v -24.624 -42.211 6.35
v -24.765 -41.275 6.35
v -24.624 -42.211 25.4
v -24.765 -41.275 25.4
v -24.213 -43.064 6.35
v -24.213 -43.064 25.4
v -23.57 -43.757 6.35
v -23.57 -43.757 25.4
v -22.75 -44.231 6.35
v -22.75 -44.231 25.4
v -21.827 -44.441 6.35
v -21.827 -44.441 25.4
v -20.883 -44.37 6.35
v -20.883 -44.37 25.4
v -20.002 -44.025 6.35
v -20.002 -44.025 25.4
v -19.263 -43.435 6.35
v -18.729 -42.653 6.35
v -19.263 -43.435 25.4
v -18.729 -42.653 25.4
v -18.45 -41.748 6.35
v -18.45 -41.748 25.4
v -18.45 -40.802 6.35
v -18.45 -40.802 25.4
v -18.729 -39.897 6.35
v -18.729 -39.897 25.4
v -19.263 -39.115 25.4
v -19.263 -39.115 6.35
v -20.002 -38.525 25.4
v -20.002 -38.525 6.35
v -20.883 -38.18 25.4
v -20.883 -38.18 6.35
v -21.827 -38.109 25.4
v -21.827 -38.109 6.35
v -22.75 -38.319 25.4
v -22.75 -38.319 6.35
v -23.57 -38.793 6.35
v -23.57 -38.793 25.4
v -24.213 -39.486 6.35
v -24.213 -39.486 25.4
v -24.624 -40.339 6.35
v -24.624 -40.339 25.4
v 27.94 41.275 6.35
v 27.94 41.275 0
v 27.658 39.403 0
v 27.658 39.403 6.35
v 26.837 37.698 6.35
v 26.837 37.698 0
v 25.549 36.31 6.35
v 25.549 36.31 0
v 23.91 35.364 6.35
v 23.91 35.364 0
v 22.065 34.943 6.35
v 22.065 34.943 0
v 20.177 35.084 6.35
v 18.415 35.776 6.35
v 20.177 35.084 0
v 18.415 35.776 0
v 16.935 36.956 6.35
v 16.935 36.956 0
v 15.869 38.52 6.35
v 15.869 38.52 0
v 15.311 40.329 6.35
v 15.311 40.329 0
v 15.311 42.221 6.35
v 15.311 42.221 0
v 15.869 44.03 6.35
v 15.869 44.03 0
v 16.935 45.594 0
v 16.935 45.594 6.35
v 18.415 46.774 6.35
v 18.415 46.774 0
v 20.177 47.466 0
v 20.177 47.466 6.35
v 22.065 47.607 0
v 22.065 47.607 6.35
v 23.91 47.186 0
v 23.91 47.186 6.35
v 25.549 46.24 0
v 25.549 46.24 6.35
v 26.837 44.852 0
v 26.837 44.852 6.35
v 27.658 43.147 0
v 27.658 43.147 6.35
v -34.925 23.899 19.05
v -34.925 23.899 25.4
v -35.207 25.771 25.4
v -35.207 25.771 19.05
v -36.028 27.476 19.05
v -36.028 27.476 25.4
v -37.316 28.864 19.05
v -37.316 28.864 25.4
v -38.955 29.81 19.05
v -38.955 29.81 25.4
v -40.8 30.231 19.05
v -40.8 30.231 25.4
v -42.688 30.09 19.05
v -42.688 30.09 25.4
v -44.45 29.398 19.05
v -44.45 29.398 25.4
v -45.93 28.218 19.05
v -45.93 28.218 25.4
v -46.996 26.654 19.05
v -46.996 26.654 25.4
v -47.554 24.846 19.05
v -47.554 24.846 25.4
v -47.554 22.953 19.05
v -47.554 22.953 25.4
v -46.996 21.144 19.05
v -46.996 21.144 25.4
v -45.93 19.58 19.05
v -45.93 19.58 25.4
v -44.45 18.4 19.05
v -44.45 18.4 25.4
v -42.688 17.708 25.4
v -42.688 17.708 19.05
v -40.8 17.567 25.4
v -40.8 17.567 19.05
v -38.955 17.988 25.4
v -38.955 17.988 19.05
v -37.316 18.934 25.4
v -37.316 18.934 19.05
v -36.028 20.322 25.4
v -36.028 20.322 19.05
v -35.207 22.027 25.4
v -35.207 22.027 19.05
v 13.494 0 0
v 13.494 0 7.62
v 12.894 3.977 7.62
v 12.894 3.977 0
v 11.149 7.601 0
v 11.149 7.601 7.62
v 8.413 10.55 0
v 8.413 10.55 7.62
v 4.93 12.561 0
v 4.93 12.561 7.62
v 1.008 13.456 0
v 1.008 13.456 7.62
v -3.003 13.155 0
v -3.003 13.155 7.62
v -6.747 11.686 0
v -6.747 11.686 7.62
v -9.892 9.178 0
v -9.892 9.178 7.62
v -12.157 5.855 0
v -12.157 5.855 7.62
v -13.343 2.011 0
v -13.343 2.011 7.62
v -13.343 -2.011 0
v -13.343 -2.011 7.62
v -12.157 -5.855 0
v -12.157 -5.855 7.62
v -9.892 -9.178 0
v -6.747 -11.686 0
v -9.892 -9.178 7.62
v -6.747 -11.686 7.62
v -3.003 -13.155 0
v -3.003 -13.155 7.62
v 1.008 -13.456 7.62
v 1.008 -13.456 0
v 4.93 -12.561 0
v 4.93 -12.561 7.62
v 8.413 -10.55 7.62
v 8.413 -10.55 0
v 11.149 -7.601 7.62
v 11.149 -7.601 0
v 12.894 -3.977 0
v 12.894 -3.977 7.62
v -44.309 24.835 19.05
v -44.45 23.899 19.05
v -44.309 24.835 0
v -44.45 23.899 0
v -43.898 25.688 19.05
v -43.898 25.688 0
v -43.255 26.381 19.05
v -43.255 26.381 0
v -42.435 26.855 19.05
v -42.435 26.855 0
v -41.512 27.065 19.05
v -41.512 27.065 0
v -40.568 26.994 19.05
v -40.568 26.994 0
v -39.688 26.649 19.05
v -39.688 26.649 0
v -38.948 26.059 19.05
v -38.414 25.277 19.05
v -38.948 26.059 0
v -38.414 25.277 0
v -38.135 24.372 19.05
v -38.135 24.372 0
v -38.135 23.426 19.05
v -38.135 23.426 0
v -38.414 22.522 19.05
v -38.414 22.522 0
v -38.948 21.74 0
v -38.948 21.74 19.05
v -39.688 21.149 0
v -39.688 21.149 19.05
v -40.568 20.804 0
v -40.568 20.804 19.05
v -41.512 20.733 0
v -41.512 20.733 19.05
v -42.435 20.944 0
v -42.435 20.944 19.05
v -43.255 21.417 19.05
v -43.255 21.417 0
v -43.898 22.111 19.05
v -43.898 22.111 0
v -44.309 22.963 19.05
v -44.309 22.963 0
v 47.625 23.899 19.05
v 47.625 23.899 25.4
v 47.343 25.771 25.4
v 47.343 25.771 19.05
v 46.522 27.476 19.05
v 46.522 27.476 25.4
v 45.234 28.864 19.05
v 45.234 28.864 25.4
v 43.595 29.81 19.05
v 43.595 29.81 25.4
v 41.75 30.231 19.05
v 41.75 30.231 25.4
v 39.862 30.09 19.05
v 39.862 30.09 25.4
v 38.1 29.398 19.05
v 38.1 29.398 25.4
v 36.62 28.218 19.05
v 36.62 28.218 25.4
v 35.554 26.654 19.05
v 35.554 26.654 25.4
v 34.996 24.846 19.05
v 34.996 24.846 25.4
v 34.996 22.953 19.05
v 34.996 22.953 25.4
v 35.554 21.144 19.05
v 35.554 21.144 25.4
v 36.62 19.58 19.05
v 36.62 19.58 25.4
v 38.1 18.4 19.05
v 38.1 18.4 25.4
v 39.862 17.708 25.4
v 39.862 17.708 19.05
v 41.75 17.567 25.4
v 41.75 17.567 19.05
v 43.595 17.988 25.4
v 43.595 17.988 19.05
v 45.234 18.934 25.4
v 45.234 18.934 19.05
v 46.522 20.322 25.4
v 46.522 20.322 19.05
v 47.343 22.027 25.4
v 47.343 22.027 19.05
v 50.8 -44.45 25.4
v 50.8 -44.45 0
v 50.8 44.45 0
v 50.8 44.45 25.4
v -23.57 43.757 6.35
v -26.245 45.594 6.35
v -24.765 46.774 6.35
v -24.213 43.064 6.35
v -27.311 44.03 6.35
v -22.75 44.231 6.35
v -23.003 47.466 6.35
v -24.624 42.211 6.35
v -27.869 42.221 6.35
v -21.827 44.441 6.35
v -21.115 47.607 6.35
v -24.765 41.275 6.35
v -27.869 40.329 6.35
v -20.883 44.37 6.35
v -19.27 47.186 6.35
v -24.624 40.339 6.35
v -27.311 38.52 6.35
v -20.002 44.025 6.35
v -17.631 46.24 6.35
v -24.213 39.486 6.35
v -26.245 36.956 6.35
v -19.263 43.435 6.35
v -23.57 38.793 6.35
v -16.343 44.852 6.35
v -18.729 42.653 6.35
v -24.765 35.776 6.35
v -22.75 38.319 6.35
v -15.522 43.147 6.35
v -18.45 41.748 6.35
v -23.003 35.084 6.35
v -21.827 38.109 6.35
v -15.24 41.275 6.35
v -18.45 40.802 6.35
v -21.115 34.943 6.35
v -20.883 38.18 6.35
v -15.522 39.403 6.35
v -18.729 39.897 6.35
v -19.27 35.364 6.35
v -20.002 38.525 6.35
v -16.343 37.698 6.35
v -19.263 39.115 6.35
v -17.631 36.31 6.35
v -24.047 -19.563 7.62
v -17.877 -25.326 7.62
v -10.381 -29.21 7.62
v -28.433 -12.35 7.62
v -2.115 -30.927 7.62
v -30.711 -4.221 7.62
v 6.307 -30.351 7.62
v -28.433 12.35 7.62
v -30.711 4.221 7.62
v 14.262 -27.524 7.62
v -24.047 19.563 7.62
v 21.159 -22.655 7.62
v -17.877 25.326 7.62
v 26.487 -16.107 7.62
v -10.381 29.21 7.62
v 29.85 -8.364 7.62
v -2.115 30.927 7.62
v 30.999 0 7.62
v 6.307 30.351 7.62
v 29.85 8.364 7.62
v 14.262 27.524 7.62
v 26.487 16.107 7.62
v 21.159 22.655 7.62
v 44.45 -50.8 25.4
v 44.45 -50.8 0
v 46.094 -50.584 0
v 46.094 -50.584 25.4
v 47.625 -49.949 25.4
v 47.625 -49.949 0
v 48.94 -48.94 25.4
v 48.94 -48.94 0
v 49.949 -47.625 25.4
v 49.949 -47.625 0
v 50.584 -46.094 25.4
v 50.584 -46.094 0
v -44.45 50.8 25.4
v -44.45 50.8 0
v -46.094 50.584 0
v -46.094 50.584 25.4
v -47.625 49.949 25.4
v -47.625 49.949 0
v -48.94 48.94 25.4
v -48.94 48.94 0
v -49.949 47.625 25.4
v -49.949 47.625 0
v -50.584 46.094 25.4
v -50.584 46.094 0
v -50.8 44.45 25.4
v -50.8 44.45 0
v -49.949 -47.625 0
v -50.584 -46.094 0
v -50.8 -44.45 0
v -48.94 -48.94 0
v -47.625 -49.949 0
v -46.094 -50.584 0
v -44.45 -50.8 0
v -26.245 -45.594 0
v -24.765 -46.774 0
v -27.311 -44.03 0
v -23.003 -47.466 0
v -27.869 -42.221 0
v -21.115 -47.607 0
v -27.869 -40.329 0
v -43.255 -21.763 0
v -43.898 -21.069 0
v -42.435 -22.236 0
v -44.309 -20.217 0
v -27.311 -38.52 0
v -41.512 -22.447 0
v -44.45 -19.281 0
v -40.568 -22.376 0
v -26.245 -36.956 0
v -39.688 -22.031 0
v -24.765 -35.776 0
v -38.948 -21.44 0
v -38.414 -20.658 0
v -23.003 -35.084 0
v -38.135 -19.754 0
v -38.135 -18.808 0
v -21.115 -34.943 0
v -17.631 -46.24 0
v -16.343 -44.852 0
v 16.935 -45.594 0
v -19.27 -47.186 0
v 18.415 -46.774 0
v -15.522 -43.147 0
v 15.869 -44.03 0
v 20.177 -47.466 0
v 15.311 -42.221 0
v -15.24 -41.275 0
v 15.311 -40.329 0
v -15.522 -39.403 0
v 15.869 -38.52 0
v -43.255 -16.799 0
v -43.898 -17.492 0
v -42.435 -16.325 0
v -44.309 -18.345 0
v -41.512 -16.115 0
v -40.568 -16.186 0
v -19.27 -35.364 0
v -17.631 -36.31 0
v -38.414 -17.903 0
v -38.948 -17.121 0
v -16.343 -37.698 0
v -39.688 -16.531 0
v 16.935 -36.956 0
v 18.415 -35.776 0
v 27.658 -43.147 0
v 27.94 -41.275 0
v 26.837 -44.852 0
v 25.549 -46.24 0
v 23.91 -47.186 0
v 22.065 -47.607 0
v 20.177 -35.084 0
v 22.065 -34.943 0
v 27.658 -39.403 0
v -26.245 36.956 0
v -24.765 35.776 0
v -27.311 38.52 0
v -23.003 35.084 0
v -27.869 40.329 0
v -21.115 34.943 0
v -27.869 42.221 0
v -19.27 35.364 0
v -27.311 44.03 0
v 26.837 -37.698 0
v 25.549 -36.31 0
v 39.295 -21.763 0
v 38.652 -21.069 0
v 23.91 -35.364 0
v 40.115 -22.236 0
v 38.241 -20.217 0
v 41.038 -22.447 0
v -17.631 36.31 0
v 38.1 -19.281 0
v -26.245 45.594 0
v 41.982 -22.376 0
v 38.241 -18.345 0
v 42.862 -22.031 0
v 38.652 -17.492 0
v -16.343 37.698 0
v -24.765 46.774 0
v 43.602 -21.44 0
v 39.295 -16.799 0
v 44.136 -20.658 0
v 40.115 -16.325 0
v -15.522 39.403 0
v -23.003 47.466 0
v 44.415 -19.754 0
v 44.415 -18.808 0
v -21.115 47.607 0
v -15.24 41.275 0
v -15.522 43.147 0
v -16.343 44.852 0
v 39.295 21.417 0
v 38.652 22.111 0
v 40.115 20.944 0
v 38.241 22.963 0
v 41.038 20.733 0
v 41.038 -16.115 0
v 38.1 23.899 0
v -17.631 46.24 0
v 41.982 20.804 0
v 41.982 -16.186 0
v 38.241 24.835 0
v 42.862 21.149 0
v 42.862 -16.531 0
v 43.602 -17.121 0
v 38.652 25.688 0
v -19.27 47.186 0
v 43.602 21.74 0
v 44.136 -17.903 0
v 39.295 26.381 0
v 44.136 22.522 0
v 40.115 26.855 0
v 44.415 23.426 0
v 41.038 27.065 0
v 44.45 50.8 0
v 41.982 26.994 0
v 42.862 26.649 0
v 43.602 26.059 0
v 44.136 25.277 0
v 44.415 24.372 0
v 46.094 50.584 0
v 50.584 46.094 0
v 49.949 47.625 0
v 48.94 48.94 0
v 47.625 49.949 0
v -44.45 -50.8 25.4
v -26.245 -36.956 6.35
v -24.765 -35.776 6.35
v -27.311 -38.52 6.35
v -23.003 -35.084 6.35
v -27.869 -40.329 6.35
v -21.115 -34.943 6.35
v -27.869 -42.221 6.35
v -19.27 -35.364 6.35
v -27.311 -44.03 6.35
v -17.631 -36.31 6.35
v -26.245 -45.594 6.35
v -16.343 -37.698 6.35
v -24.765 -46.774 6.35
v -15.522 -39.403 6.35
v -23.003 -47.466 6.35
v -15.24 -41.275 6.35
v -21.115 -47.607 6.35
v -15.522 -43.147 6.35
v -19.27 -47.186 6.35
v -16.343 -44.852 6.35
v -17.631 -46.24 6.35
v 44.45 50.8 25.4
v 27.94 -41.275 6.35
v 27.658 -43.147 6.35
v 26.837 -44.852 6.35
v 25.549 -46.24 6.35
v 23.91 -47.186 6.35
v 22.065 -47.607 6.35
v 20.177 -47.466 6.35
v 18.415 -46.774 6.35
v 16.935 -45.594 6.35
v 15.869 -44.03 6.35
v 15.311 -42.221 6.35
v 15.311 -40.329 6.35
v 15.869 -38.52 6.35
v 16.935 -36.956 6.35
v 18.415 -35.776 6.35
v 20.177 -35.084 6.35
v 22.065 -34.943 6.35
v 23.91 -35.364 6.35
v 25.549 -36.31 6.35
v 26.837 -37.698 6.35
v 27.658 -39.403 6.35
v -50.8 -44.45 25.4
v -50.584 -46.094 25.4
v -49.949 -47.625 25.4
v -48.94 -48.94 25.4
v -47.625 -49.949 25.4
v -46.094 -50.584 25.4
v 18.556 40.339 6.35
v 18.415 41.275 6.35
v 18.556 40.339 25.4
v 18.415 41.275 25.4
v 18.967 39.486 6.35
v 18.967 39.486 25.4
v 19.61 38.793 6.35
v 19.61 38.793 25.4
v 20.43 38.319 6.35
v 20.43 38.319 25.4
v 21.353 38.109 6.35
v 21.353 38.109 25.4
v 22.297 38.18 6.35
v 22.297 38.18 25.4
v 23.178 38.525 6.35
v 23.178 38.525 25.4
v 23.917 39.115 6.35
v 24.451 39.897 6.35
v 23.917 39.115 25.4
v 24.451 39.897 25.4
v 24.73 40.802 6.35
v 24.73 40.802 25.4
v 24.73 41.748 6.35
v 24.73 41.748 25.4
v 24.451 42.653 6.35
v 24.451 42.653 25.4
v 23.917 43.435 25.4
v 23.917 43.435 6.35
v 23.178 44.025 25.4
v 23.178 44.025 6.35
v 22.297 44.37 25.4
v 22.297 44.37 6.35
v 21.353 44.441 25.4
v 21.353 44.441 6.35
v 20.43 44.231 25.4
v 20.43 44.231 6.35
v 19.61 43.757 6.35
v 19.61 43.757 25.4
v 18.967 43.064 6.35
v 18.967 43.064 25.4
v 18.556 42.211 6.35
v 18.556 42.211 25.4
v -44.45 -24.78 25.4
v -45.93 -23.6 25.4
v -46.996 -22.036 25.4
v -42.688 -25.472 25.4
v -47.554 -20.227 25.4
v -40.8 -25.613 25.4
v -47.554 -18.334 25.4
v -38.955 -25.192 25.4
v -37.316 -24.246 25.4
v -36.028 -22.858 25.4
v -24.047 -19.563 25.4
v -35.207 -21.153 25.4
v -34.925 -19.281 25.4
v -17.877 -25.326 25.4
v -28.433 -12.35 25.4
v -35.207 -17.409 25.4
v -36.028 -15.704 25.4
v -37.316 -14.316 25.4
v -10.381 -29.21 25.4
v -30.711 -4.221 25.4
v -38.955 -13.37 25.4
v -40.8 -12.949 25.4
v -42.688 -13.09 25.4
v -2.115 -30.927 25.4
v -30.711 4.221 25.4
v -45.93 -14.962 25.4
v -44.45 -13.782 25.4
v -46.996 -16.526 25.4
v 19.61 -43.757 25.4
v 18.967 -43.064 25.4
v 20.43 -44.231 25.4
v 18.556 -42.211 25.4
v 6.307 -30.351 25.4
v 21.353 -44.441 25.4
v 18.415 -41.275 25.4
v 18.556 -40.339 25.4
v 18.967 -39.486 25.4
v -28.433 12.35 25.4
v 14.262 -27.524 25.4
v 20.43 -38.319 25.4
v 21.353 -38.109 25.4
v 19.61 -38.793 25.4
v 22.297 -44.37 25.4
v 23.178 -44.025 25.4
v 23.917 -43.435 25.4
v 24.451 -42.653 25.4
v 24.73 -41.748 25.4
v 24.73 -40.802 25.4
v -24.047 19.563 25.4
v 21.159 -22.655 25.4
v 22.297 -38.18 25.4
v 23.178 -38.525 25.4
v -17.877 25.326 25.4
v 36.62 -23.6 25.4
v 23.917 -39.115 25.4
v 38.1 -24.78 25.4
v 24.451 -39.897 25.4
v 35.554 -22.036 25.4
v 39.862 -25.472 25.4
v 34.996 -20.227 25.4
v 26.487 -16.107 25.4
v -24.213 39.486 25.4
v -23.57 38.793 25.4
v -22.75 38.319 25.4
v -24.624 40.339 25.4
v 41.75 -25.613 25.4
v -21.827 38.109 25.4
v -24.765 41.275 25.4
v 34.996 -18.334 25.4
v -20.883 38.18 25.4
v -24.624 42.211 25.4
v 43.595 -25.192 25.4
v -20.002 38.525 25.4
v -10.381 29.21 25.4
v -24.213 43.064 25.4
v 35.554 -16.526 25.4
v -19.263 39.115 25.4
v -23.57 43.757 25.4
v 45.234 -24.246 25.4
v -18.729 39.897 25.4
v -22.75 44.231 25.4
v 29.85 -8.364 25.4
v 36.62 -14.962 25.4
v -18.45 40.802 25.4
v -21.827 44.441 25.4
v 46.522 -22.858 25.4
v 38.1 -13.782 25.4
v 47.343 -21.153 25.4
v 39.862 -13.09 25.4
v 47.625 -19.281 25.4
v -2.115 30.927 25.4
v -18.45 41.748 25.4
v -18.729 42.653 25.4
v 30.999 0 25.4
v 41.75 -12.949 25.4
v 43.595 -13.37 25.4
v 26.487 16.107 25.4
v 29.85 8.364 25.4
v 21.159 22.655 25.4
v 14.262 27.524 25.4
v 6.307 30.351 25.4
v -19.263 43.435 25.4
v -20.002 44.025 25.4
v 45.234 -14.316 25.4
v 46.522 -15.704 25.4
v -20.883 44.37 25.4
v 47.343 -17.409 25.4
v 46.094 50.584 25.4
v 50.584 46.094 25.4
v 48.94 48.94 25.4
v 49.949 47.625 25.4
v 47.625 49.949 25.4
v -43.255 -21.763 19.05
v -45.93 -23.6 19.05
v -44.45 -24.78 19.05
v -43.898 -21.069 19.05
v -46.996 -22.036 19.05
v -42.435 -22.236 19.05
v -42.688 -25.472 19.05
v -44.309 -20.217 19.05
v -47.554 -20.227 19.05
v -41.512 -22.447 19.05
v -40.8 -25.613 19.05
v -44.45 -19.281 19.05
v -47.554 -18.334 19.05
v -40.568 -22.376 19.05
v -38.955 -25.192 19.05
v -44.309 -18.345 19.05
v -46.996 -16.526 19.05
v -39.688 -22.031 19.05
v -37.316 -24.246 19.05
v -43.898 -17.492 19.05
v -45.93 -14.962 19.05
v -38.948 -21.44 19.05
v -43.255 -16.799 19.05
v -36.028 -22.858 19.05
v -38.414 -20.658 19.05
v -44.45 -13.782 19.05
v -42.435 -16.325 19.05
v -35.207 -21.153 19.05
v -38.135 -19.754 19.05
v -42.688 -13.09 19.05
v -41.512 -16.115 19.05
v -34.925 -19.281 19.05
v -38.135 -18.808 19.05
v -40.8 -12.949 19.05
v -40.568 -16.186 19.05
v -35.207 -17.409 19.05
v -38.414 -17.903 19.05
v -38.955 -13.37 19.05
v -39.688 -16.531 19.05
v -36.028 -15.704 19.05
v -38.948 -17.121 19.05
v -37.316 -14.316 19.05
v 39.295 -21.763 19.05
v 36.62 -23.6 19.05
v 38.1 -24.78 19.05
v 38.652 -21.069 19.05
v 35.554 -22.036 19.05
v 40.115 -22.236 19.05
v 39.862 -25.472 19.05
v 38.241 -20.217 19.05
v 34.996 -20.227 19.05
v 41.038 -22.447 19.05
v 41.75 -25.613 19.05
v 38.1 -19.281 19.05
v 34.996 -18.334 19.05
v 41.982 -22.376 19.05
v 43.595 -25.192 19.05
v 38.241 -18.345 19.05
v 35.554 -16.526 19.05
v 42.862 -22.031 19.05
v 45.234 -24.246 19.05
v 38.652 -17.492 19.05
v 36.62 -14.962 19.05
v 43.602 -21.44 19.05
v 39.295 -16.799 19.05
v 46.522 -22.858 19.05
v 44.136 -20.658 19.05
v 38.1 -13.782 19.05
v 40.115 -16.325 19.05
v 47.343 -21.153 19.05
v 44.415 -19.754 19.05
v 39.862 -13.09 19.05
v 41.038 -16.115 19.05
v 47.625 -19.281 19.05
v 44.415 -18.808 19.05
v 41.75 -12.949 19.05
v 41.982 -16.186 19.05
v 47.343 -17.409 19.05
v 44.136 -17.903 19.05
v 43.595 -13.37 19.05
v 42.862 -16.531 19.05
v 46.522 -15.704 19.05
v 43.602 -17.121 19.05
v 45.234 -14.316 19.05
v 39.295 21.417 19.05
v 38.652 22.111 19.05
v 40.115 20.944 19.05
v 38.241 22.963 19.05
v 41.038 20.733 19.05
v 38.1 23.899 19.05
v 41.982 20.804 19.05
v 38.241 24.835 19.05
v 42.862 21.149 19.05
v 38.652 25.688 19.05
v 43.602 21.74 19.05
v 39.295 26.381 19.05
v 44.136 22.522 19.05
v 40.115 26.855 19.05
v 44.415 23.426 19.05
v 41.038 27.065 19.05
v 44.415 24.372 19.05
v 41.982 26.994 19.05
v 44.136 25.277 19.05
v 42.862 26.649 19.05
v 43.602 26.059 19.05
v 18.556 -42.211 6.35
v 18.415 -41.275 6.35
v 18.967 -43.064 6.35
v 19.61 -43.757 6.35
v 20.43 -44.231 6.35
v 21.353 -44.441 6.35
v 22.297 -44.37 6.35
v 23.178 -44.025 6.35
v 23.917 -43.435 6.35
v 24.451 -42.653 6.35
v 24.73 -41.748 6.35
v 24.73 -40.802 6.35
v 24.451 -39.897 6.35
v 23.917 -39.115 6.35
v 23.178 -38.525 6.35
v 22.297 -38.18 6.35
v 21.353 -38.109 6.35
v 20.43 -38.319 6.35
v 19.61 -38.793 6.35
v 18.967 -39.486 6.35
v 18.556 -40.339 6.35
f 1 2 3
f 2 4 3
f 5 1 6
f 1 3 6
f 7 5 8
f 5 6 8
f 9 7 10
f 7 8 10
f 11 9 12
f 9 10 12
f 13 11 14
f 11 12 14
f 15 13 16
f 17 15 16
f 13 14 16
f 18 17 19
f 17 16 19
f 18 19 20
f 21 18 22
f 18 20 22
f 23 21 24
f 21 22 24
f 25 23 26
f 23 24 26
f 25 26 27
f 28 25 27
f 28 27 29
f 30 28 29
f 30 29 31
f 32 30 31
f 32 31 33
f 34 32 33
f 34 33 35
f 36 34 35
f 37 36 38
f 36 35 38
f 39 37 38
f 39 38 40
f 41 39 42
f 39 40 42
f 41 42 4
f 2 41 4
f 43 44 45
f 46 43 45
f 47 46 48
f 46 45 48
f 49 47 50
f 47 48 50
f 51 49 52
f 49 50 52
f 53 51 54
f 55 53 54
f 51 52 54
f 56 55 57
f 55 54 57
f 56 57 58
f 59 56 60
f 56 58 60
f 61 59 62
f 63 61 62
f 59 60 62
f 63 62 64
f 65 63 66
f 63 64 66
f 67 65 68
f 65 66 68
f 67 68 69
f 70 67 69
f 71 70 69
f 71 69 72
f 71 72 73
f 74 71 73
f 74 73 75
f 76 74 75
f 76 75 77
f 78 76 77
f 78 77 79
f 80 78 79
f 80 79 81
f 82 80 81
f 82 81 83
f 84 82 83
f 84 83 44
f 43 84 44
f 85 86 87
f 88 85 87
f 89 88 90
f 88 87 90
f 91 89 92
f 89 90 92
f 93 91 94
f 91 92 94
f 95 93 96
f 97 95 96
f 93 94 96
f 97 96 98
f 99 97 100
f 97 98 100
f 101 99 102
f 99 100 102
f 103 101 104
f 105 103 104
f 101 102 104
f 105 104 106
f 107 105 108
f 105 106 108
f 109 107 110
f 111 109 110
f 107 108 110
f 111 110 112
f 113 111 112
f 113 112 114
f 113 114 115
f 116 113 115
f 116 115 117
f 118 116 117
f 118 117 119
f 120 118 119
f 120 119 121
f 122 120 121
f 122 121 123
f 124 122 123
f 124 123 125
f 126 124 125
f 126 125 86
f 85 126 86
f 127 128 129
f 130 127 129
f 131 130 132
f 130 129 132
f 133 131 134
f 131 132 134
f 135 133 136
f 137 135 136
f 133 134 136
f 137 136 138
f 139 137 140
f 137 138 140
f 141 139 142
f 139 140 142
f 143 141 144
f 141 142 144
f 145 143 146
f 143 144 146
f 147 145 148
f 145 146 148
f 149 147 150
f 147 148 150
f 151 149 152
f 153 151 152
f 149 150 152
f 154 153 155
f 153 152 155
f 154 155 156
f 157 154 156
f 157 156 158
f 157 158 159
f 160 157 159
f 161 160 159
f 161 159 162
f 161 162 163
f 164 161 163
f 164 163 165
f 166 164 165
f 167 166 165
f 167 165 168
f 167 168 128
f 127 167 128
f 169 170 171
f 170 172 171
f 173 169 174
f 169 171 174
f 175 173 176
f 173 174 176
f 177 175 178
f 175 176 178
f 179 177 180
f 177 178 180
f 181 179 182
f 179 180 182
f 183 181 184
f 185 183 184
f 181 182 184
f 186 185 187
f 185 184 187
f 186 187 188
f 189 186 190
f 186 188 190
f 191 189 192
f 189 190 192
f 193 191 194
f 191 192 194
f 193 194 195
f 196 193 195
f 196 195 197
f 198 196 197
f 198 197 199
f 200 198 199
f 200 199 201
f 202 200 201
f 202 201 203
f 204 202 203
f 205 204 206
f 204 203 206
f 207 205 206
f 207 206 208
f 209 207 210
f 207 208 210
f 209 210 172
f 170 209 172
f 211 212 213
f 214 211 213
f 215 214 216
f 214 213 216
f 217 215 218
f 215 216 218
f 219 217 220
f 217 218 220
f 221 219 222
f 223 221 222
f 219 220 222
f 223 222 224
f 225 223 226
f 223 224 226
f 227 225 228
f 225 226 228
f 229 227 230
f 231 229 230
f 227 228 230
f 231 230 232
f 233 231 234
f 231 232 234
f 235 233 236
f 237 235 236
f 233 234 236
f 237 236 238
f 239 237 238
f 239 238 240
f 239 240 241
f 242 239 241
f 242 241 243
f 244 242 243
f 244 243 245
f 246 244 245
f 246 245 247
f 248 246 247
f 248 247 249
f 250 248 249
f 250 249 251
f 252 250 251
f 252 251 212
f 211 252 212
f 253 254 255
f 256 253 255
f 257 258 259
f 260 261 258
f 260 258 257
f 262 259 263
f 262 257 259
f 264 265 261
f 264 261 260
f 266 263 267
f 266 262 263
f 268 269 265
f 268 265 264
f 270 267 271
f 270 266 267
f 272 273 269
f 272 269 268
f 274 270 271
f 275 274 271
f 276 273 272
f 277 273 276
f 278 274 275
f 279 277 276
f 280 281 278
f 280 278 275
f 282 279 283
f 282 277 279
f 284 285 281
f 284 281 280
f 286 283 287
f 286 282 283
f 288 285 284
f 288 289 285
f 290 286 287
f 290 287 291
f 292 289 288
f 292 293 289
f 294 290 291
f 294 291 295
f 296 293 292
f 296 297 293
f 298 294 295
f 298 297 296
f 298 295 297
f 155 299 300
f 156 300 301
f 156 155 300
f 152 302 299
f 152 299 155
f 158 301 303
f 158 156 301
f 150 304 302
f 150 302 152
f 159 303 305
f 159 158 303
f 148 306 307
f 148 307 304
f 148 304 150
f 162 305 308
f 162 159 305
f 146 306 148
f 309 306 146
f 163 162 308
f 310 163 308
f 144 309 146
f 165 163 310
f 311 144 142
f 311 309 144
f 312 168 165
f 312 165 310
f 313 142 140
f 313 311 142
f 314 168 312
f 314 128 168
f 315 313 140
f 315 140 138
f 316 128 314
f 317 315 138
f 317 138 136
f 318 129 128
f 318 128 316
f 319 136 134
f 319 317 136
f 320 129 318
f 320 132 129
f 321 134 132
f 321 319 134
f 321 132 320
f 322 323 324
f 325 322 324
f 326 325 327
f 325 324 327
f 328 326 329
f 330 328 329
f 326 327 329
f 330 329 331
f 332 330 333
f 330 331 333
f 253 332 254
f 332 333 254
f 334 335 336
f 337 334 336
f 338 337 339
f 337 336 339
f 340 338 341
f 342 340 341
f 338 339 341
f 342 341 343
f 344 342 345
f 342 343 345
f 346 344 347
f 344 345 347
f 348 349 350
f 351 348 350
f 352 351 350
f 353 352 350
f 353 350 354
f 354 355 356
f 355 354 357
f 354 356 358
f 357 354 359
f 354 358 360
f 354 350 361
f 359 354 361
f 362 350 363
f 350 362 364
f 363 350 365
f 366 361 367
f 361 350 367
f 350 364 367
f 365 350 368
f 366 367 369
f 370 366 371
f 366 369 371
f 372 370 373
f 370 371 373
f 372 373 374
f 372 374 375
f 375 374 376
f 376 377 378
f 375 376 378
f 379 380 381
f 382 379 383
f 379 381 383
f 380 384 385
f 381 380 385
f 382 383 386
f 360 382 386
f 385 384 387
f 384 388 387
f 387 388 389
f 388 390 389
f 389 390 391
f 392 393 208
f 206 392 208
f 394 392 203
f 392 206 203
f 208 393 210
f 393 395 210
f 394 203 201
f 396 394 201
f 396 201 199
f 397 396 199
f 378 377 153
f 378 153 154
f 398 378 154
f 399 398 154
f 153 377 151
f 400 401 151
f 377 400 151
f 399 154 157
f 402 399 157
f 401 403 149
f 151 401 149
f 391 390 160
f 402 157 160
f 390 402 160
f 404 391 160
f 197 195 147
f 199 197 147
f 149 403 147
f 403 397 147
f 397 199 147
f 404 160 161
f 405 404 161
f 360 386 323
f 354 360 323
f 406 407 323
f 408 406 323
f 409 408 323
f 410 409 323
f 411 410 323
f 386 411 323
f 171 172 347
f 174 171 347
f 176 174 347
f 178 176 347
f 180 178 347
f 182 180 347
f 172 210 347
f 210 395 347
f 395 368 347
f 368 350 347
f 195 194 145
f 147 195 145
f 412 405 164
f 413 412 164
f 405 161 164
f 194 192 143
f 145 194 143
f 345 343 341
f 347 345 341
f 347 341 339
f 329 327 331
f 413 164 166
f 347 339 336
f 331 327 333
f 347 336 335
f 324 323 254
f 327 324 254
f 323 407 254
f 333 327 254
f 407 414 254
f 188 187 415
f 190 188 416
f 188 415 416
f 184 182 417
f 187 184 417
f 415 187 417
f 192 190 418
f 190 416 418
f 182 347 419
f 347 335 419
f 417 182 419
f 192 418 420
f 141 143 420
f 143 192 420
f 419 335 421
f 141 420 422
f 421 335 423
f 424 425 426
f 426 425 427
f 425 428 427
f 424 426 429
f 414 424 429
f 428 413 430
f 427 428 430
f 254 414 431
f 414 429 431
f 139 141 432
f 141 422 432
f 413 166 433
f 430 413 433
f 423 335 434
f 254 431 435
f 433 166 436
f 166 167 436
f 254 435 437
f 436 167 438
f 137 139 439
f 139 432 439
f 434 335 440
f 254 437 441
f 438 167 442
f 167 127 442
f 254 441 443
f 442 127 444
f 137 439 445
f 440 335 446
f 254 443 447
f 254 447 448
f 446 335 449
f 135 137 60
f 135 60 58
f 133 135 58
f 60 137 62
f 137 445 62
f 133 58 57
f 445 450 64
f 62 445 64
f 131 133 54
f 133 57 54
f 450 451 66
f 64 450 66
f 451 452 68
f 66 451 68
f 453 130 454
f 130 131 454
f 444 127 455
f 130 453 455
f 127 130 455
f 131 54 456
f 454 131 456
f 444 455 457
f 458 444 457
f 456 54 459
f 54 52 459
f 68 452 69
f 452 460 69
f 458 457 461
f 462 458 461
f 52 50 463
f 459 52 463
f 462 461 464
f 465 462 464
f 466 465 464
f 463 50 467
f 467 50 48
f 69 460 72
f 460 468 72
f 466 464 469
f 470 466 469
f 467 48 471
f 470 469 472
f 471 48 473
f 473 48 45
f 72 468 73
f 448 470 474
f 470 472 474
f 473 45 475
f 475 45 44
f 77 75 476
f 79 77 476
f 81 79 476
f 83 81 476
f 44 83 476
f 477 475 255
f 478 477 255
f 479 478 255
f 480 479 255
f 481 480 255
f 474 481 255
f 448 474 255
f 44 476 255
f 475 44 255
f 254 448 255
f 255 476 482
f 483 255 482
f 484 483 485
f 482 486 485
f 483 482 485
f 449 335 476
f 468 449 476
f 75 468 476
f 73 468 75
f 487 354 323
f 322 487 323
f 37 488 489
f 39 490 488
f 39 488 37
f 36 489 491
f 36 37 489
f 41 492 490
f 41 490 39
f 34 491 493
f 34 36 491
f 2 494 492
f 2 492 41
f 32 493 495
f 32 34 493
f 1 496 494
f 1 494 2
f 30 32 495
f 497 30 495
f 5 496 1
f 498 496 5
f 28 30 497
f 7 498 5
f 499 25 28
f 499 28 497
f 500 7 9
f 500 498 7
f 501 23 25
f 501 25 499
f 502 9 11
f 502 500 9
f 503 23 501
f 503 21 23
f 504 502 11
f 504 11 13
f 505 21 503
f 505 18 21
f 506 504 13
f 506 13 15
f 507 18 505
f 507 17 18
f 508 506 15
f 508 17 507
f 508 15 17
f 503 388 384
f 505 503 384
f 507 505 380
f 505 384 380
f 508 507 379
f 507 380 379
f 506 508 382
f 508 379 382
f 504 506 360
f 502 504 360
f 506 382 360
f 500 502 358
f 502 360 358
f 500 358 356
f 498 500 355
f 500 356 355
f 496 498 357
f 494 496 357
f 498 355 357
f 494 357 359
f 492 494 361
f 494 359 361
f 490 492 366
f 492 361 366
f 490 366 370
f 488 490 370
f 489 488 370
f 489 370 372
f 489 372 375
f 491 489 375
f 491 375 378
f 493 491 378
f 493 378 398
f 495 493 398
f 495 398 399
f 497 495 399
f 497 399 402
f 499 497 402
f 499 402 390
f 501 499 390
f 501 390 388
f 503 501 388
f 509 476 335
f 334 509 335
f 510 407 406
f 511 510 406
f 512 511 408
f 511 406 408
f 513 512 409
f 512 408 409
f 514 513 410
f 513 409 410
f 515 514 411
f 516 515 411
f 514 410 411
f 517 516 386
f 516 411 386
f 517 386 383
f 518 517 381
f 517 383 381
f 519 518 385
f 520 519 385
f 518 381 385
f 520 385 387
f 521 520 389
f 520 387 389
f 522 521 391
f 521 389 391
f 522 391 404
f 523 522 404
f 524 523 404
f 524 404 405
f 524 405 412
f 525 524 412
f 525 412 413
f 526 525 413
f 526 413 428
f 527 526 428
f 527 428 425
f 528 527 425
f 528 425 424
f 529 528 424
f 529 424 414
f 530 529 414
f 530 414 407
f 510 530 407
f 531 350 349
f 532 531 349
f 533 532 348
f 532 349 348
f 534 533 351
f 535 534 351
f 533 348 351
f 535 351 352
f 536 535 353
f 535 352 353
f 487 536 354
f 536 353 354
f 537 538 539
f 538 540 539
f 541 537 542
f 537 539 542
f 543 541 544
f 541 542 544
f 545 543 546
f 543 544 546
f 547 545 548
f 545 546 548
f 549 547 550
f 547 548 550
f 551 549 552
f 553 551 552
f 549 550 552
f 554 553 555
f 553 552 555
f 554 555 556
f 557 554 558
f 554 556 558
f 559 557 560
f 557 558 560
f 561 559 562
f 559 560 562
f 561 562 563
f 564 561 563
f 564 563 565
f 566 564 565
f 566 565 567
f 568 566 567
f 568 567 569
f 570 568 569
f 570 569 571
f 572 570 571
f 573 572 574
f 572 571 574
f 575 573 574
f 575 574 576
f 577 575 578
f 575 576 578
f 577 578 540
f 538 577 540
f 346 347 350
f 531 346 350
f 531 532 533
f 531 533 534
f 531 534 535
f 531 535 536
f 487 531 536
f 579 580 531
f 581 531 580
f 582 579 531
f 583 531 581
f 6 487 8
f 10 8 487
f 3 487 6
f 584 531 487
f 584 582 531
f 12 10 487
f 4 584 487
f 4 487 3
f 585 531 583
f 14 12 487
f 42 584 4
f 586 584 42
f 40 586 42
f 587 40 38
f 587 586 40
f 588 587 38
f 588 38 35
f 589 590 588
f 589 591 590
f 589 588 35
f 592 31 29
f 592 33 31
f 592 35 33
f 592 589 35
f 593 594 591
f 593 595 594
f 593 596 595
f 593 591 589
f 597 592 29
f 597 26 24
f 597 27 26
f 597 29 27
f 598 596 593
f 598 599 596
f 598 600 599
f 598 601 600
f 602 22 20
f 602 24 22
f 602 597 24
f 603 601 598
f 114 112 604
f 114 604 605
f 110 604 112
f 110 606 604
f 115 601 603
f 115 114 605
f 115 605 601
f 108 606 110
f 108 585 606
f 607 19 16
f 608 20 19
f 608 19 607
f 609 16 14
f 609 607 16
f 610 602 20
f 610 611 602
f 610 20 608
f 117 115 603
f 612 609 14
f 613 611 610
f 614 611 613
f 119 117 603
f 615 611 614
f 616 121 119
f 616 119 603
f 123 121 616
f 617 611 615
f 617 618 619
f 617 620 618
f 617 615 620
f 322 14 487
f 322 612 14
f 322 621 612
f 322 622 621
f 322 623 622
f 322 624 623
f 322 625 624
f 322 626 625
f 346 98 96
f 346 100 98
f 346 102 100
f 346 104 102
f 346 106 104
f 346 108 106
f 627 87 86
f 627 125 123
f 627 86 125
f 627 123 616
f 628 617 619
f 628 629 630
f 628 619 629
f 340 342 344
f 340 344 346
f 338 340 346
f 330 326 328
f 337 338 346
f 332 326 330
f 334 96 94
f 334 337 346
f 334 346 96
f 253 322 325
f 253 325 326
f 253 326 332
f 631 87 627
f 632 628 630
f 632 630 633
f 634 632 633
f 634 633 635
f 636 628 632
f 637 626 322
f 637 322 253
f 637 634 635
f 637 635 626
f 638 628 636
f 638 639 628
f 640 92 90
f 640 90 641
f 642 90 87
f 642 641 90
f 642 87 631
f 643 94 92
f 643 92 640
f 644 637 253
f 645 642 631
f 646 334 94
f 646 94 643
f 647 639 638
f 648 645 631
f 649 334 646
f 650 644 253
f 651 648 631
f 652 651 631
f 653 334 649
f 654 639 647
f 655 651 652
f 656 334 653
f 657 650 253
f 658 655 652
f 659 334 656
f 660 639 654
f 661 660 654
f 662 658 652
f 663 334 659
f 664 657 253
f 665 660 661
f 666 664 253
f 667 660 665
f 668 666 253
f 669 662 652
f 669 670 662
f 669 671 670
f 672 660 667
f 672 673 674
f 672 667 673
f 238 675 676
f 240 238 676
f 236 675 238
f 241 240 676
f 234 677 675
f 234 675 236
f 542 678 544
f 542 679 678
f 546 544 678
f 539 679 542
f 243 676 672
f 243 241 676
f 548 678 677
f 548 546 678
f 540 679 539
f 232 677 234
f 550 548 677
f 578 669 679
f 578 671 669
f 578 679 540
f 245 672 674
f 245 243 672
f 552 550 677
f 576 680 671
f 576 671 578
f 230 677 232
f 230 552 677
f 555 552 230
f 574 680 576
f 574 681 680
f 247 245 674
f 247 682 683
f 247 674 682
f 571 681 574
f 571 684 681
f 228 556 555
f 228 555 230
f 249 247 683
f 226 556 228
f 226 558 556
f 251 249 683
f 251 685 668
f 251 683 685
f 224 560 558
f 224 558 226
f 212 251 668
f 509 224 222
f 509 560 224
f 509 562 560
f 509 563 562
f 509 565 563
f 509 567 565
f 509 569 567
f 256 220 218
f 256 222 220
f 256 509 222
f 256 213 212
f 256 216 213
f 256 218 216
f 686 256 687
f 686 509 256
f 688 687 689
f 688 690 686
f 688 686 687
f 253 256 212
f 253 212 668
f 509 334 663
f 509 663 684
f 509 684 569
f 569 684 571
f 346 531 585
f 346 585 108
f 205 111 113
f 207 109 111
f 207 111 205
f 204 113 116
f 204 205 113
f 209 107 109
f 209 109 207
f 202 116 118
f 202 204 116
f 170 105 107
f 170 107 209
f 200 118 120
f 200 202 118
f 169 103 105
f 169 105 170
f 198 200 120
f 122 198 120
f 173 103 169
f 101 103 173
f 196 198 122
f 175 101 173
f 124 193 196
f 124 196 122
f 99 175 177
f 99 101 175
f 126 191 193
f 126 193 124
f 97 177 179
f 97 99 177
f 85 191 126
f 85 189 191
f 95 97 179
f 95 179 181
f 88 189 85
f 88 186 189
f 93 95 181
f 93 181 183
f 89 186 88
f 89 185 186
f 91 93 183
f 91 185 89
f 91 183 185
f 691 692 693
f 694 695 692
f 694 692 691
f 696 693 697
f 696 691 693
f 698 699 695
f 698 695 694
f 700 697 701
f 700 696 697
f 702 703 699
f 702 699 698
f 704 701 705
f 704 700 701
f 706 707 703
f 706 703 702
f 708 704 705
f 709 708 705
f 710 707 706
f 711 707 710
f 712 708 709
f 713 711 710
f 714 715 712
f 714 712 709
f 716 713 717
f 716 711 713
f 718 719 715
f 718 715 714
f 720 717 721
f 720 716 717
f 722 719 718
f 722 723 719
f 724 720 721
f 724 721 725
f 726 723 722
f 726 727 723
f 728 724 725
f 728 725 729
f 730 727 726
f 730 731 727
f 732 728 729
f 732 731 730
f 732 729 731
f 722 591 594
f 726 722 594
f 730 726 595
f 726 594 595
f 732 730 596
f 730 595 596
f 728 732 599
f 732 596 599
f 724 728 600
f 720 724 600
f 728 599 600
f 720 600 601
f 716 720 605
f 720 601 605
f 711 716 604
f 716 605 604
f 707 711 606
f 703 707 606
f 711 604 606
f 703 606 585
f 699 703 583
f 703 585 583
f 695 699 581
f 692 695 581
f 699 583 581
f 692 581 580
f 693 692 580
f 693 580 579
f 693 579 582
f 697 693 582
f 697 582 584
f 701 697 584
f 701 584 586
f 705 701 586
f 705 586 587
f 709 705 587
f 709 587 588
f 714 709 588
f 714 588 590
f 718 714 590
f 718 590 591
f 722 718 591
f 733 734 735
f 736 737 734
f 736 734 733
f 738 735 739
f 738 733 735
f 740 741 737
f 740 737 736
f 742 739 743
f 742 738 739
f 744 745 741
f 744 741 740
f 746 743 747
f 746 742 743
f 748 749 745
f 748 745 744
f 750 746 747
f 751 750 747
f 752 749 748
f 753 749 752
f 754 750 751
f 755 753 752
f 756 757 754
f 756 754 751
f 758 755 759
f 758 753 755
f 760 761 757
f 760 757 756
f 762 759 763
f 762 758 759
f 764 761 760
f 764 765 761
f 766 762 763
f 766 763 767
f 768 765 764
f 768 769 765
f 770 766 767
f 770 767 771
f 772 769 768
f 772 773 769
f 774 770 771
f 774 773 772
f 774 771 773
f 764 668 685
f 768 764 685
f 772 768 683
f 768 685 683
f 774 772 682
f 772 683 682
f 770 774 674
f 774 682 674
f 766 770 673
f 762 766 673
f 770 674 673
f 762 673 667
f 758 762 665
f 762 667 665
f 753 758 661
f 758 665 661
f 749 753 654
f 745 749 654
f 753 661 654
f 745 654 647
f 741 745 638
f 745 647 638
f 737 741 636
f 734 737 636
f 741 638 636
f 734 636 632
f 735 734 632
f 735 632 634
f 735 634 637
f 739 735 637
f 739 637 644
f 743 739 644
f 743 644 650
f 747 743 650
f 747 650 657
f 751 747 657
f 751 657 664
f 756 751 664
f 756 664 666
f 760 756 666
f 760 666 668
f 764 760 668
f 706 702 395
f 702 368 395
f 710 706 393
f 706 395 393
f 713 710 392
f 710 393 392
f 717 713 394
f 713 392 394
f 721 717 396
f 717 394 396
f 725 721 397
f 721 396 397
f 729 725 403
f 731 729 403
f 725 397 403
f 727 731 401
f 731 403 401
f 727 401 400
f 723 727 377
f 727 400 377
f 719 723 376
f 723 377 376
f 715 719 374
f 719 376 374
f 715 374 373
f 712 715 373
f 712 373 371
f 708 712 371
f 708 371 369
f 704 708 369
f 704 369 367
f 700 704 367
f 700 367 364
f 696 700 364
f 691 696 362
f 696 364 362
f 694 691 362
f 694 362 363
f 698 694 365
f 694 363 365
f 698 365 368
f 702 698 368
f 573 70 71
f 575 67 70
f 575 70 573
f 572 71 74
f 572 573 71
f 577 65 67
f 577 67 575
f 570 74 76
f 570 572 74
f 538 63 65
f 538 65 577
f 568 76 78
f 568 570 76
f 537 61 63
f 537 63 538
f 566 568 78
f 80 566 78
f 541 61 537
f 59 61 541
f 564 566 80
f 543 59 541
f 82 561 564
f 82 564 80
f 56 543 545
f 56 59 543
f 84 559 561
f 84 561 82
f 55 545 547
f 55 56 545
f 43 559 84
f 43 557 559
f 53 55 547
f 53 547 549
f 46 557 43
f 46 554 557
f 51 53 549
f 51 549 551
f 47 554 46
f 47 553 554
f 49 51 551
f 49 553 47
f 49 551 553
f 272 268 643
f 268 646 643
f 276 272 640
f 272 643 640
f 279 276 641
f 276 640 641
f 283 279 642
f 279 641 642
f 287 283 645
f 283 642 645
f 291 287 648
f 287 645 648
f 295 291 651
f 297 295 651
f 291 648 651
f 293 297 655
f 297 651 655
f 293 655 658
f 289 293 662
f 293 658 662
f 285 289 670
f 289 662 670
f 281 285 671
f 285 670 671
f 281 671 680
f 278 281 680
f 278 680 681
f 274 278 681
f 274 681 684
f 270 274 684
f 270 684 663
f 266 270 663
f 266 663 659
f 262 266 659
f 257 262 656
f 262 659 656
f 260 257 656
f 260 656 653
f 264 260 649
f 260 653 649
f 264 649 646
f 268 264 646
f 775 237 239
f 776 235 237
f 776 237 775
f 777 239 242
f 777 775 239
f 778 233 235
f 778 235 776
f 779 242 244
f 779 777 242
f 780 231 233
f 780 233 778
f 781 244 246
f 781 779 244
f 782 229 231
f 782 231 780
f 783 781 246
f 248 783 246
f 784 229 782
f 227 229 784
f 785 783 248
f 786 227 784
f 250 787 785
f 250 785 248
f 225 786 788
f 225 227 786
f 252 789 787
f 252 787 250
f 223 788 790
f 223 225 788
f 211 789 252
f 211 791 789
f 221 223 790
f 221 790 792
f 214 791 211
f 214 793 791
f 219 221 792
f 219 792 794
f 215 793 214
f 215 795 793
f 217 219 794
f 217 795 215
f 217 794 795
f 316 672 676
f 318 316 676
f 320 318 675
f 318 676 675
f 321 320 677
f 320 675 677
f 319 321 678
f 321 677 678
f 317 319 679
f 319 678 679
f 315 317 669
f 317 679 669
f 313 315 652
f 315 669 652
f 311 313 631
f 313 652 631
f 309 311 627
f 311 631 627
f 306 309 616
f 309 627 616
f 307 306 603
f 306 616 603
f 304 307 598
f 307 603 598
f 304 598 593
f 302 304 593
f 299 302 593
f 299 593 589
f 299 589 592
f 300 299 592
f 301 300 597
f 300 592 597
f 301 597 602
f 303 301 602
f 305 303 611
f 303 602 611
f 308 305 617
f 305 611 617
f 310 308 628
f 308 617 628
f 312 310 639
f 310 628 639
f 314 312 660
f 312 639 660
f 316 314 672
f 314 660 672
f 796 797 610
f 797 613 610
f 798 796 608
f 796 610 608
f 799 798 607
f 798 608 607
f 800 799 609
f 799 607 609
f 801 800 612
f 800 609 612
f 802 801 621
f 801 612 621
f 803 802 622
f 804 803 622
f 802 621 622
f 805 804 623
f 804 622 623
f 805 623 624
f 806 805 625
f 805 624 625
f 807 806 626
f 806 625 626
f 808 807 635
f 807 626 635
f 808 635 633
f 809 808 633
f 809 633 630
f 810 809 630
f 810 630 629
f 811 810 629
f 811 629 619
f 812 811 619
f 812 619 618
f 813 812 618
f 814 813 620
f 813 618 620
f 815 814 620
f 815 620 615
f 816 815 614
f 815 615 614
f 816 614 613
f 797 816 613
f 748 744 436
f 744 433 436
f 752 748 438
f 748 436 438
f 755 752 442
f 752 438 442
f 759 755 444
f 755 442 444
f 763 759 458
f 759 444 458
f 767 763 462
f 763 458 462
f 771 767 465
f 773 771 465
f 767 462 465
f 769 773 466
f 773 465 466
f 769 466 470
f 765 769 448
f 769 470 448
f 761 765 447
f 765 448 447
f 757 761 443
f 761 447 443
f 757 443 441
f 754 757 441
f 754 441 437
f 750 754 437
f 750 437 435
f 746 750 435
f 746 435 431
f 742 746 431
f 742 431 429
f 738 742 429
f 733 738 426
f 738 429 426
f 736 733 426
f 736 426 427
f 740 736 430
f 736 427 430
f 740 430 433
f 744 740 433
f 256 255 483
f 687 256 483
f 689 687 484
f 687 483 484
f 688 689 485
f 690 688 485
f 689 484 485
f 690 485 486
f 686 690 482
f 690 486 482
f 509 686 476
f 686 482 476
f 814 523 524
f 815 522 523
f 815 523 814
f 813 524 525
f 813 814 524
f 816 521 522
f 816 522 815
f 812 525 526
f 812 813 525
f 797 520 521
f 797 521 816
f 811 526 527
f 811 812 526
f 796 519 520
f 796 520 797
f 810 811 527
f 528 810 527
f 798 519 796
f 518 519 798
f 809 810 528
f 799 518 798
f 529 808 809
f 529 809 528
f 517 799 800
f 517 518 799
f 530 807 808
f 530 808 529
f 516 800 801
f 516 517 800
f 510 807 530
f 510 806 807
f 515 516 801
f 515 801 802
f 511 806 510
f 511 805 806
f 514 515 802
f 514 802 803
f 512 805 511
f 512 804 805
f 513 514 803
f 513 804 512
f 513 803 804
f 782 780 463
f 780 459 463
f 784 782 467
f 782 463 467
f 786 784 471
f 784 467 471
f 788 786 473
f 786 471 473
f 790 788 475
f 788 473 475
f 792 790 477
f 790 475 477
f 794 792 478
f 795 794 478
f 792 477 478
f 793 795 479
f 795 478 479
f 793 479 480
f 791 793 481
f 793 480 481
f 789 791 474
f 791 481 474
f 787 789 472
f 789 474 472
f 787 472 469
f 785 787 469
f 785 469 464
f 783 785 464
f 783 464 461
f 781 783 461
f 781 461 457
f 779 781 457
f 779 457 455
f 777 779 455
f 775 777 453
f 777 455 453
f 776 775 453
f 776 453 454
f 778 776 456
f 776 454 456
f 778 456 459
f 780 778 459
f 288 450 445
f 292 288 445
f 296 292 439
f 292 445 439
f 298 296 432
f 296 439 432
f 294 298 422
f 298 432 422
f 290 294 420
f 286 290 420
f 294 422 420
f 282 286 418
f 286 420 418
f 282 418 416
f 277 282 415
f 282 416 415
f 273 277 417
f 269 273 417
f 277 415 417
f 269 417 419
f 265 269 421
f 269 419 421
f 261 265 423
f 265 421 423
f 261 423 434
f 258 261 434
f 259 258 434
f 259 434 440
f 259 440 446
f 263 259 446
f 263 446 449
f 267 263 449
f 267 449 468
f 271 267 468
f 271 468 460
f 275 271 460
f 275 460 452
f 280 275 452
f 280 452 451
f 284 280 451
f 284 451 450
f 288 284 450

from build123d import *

# Parameters (mm, degrees)
F1_DEPTH        = 25.4
F2_R            = 13.49375
F3_DEPTH        = 25.4
F4_R            = 30.99943
F4_R_2          = 13.49375
F5_DEPTH        = 17.78
F6_R            = 31.0007
F6_R_2          = 12.50061
F7_DEPTH        = 16.99768
F8_DEPTH        = 16.99768
F11_D           = 6.35
F11_DEPTH       = 38.1
F11_CBORE_D     = 12.7
F11_CBORE_DEPTH = 6.35
F11_TIP         = 1.9077324654
F13_D           = 6.35
F13_DEPTH       = 38.1
F13_CBORE_D     = 12.7
F13_CBORE_DEPTH = 6.35
F13_TIP         = 1.9077324654


# Not quite as in the source:
# - a feature names something its author has since deleted; it is built from what else it names


with BuildPart() as f1:
    # F0 (on Top) → F1 (new body)
    with BuildSketch(Plane.XY):
        with BuildLine():
            ThreePointArc((-50.8, -44.45), (-48.9401280605, -48.9401280605), (-44.45, -50.8))
            Line((-44.45, -50.8), (-31.75, -50.8))
            Line((-31.75, -50.8), (31.75, -50.8))
            Line((31.75, -50.8), (44.45, -50.8))
            ThreePointArc((44.45, -50.8), (48.9401280605, -48.9401280605), (50.8, -44.45))
            Line((50.8, -44.45), (50.8, 44.45))
            ThreePointArc((50.8, 44.45), (48.9401280605, 48.9401280605), (44.45, 50.8))
            Line((44.45, 50.8), (-44.45, 50.8))
            ThreePointArc((-44.45, 50.8), (-48.9401280605, 48.9401280605), (-50.8, 44.45))
            Line((-50.8, 44.45), (-50.8, -44.45))
        make_face()
    extrude(amount=F1_DEPTH)

    # F2 (on face) → F3 (cut)
    with BuildSketch(Plane.XY.offset(25.4)):
        Circle(F2_R)
    extrude(amount=-F3_DEPTH, mode=Mode.SUBTRACT)

    # F4 (on face) → F5 (cut)
    with BuildSketch(Plane.XY.offset(25.4)):
        Circle(F4_R)
        Circle(F4_R_2, mode=Mode.SUBTRACT)
    extrude(amount=-F5_DEPTH, mode=Mode.SUBTRACT)

    # F11
    with Locations(Plane(origin=(0, 0, 0), x_dir=(1, 0, 0), z_dir=(0, 0, -1))):
        with Locations((-21.59, -41.275), (21.59, -41.275), (-21.59, 41.275), (21.59, 41.275)):
            CounterBoreHole(F11_D / 2, F11_CBORE_D / 2, F11_CBORE_DEPTH, depth=F11_DEPTH)
            with Locations((0, 0, -(F11_DEPTH + F11_TIP / 2))):  # 118° drill point
                Cone(0, F11_D / 2, F11_TIP, mode=Mode.SUBTRACT)

    # F13
    with Locations(Plane.XY.offset(25.4)):
        with Locations((-41.275, 23.8990909091), (-41.275, -19.2809090909), (41.275, 23.8990909091), (41.275, -19.2809090909)):
            CounterBoreHole(F13_D / 2, F13_CBORE_D / 2, F13_CBORE_DEPTH, depth=F13_DEPTH)
            with Locations((0, 0, -(F13_DEPTH + F13_TIP / 2))):  # 118° drill point
                Cone(0, F13_D / 2, F13_TIP, mode=Mode.SUBTRACT)


with BuildPart() as f7:
    # F6 (on Top) → F7 (new body)
    with BuildSketch(Plane.XY):
        with Locations((-113.8032615222, 0)):
            Circle(F6_R)
        with Locations((-113.8032615222, 0)):
            Circle(F6_R_2, mode=Mode.SUBTRACT)
    extrude(amount=F7_DEPTH)


with BuildPart() as f8:
    # F6 (on Top) → F8 (new body)
    with BuildSketch(Plane.XY):
        with Locations((-113.8032615222, 0)):
            Circle(F6_R)
        with Locations((-113.8032615222, 0)):
            Circle(F6_R_2, mode=Mode.SUBTRACT)
    extrude(amount=F8_DEPTH)


solid = f1.part
